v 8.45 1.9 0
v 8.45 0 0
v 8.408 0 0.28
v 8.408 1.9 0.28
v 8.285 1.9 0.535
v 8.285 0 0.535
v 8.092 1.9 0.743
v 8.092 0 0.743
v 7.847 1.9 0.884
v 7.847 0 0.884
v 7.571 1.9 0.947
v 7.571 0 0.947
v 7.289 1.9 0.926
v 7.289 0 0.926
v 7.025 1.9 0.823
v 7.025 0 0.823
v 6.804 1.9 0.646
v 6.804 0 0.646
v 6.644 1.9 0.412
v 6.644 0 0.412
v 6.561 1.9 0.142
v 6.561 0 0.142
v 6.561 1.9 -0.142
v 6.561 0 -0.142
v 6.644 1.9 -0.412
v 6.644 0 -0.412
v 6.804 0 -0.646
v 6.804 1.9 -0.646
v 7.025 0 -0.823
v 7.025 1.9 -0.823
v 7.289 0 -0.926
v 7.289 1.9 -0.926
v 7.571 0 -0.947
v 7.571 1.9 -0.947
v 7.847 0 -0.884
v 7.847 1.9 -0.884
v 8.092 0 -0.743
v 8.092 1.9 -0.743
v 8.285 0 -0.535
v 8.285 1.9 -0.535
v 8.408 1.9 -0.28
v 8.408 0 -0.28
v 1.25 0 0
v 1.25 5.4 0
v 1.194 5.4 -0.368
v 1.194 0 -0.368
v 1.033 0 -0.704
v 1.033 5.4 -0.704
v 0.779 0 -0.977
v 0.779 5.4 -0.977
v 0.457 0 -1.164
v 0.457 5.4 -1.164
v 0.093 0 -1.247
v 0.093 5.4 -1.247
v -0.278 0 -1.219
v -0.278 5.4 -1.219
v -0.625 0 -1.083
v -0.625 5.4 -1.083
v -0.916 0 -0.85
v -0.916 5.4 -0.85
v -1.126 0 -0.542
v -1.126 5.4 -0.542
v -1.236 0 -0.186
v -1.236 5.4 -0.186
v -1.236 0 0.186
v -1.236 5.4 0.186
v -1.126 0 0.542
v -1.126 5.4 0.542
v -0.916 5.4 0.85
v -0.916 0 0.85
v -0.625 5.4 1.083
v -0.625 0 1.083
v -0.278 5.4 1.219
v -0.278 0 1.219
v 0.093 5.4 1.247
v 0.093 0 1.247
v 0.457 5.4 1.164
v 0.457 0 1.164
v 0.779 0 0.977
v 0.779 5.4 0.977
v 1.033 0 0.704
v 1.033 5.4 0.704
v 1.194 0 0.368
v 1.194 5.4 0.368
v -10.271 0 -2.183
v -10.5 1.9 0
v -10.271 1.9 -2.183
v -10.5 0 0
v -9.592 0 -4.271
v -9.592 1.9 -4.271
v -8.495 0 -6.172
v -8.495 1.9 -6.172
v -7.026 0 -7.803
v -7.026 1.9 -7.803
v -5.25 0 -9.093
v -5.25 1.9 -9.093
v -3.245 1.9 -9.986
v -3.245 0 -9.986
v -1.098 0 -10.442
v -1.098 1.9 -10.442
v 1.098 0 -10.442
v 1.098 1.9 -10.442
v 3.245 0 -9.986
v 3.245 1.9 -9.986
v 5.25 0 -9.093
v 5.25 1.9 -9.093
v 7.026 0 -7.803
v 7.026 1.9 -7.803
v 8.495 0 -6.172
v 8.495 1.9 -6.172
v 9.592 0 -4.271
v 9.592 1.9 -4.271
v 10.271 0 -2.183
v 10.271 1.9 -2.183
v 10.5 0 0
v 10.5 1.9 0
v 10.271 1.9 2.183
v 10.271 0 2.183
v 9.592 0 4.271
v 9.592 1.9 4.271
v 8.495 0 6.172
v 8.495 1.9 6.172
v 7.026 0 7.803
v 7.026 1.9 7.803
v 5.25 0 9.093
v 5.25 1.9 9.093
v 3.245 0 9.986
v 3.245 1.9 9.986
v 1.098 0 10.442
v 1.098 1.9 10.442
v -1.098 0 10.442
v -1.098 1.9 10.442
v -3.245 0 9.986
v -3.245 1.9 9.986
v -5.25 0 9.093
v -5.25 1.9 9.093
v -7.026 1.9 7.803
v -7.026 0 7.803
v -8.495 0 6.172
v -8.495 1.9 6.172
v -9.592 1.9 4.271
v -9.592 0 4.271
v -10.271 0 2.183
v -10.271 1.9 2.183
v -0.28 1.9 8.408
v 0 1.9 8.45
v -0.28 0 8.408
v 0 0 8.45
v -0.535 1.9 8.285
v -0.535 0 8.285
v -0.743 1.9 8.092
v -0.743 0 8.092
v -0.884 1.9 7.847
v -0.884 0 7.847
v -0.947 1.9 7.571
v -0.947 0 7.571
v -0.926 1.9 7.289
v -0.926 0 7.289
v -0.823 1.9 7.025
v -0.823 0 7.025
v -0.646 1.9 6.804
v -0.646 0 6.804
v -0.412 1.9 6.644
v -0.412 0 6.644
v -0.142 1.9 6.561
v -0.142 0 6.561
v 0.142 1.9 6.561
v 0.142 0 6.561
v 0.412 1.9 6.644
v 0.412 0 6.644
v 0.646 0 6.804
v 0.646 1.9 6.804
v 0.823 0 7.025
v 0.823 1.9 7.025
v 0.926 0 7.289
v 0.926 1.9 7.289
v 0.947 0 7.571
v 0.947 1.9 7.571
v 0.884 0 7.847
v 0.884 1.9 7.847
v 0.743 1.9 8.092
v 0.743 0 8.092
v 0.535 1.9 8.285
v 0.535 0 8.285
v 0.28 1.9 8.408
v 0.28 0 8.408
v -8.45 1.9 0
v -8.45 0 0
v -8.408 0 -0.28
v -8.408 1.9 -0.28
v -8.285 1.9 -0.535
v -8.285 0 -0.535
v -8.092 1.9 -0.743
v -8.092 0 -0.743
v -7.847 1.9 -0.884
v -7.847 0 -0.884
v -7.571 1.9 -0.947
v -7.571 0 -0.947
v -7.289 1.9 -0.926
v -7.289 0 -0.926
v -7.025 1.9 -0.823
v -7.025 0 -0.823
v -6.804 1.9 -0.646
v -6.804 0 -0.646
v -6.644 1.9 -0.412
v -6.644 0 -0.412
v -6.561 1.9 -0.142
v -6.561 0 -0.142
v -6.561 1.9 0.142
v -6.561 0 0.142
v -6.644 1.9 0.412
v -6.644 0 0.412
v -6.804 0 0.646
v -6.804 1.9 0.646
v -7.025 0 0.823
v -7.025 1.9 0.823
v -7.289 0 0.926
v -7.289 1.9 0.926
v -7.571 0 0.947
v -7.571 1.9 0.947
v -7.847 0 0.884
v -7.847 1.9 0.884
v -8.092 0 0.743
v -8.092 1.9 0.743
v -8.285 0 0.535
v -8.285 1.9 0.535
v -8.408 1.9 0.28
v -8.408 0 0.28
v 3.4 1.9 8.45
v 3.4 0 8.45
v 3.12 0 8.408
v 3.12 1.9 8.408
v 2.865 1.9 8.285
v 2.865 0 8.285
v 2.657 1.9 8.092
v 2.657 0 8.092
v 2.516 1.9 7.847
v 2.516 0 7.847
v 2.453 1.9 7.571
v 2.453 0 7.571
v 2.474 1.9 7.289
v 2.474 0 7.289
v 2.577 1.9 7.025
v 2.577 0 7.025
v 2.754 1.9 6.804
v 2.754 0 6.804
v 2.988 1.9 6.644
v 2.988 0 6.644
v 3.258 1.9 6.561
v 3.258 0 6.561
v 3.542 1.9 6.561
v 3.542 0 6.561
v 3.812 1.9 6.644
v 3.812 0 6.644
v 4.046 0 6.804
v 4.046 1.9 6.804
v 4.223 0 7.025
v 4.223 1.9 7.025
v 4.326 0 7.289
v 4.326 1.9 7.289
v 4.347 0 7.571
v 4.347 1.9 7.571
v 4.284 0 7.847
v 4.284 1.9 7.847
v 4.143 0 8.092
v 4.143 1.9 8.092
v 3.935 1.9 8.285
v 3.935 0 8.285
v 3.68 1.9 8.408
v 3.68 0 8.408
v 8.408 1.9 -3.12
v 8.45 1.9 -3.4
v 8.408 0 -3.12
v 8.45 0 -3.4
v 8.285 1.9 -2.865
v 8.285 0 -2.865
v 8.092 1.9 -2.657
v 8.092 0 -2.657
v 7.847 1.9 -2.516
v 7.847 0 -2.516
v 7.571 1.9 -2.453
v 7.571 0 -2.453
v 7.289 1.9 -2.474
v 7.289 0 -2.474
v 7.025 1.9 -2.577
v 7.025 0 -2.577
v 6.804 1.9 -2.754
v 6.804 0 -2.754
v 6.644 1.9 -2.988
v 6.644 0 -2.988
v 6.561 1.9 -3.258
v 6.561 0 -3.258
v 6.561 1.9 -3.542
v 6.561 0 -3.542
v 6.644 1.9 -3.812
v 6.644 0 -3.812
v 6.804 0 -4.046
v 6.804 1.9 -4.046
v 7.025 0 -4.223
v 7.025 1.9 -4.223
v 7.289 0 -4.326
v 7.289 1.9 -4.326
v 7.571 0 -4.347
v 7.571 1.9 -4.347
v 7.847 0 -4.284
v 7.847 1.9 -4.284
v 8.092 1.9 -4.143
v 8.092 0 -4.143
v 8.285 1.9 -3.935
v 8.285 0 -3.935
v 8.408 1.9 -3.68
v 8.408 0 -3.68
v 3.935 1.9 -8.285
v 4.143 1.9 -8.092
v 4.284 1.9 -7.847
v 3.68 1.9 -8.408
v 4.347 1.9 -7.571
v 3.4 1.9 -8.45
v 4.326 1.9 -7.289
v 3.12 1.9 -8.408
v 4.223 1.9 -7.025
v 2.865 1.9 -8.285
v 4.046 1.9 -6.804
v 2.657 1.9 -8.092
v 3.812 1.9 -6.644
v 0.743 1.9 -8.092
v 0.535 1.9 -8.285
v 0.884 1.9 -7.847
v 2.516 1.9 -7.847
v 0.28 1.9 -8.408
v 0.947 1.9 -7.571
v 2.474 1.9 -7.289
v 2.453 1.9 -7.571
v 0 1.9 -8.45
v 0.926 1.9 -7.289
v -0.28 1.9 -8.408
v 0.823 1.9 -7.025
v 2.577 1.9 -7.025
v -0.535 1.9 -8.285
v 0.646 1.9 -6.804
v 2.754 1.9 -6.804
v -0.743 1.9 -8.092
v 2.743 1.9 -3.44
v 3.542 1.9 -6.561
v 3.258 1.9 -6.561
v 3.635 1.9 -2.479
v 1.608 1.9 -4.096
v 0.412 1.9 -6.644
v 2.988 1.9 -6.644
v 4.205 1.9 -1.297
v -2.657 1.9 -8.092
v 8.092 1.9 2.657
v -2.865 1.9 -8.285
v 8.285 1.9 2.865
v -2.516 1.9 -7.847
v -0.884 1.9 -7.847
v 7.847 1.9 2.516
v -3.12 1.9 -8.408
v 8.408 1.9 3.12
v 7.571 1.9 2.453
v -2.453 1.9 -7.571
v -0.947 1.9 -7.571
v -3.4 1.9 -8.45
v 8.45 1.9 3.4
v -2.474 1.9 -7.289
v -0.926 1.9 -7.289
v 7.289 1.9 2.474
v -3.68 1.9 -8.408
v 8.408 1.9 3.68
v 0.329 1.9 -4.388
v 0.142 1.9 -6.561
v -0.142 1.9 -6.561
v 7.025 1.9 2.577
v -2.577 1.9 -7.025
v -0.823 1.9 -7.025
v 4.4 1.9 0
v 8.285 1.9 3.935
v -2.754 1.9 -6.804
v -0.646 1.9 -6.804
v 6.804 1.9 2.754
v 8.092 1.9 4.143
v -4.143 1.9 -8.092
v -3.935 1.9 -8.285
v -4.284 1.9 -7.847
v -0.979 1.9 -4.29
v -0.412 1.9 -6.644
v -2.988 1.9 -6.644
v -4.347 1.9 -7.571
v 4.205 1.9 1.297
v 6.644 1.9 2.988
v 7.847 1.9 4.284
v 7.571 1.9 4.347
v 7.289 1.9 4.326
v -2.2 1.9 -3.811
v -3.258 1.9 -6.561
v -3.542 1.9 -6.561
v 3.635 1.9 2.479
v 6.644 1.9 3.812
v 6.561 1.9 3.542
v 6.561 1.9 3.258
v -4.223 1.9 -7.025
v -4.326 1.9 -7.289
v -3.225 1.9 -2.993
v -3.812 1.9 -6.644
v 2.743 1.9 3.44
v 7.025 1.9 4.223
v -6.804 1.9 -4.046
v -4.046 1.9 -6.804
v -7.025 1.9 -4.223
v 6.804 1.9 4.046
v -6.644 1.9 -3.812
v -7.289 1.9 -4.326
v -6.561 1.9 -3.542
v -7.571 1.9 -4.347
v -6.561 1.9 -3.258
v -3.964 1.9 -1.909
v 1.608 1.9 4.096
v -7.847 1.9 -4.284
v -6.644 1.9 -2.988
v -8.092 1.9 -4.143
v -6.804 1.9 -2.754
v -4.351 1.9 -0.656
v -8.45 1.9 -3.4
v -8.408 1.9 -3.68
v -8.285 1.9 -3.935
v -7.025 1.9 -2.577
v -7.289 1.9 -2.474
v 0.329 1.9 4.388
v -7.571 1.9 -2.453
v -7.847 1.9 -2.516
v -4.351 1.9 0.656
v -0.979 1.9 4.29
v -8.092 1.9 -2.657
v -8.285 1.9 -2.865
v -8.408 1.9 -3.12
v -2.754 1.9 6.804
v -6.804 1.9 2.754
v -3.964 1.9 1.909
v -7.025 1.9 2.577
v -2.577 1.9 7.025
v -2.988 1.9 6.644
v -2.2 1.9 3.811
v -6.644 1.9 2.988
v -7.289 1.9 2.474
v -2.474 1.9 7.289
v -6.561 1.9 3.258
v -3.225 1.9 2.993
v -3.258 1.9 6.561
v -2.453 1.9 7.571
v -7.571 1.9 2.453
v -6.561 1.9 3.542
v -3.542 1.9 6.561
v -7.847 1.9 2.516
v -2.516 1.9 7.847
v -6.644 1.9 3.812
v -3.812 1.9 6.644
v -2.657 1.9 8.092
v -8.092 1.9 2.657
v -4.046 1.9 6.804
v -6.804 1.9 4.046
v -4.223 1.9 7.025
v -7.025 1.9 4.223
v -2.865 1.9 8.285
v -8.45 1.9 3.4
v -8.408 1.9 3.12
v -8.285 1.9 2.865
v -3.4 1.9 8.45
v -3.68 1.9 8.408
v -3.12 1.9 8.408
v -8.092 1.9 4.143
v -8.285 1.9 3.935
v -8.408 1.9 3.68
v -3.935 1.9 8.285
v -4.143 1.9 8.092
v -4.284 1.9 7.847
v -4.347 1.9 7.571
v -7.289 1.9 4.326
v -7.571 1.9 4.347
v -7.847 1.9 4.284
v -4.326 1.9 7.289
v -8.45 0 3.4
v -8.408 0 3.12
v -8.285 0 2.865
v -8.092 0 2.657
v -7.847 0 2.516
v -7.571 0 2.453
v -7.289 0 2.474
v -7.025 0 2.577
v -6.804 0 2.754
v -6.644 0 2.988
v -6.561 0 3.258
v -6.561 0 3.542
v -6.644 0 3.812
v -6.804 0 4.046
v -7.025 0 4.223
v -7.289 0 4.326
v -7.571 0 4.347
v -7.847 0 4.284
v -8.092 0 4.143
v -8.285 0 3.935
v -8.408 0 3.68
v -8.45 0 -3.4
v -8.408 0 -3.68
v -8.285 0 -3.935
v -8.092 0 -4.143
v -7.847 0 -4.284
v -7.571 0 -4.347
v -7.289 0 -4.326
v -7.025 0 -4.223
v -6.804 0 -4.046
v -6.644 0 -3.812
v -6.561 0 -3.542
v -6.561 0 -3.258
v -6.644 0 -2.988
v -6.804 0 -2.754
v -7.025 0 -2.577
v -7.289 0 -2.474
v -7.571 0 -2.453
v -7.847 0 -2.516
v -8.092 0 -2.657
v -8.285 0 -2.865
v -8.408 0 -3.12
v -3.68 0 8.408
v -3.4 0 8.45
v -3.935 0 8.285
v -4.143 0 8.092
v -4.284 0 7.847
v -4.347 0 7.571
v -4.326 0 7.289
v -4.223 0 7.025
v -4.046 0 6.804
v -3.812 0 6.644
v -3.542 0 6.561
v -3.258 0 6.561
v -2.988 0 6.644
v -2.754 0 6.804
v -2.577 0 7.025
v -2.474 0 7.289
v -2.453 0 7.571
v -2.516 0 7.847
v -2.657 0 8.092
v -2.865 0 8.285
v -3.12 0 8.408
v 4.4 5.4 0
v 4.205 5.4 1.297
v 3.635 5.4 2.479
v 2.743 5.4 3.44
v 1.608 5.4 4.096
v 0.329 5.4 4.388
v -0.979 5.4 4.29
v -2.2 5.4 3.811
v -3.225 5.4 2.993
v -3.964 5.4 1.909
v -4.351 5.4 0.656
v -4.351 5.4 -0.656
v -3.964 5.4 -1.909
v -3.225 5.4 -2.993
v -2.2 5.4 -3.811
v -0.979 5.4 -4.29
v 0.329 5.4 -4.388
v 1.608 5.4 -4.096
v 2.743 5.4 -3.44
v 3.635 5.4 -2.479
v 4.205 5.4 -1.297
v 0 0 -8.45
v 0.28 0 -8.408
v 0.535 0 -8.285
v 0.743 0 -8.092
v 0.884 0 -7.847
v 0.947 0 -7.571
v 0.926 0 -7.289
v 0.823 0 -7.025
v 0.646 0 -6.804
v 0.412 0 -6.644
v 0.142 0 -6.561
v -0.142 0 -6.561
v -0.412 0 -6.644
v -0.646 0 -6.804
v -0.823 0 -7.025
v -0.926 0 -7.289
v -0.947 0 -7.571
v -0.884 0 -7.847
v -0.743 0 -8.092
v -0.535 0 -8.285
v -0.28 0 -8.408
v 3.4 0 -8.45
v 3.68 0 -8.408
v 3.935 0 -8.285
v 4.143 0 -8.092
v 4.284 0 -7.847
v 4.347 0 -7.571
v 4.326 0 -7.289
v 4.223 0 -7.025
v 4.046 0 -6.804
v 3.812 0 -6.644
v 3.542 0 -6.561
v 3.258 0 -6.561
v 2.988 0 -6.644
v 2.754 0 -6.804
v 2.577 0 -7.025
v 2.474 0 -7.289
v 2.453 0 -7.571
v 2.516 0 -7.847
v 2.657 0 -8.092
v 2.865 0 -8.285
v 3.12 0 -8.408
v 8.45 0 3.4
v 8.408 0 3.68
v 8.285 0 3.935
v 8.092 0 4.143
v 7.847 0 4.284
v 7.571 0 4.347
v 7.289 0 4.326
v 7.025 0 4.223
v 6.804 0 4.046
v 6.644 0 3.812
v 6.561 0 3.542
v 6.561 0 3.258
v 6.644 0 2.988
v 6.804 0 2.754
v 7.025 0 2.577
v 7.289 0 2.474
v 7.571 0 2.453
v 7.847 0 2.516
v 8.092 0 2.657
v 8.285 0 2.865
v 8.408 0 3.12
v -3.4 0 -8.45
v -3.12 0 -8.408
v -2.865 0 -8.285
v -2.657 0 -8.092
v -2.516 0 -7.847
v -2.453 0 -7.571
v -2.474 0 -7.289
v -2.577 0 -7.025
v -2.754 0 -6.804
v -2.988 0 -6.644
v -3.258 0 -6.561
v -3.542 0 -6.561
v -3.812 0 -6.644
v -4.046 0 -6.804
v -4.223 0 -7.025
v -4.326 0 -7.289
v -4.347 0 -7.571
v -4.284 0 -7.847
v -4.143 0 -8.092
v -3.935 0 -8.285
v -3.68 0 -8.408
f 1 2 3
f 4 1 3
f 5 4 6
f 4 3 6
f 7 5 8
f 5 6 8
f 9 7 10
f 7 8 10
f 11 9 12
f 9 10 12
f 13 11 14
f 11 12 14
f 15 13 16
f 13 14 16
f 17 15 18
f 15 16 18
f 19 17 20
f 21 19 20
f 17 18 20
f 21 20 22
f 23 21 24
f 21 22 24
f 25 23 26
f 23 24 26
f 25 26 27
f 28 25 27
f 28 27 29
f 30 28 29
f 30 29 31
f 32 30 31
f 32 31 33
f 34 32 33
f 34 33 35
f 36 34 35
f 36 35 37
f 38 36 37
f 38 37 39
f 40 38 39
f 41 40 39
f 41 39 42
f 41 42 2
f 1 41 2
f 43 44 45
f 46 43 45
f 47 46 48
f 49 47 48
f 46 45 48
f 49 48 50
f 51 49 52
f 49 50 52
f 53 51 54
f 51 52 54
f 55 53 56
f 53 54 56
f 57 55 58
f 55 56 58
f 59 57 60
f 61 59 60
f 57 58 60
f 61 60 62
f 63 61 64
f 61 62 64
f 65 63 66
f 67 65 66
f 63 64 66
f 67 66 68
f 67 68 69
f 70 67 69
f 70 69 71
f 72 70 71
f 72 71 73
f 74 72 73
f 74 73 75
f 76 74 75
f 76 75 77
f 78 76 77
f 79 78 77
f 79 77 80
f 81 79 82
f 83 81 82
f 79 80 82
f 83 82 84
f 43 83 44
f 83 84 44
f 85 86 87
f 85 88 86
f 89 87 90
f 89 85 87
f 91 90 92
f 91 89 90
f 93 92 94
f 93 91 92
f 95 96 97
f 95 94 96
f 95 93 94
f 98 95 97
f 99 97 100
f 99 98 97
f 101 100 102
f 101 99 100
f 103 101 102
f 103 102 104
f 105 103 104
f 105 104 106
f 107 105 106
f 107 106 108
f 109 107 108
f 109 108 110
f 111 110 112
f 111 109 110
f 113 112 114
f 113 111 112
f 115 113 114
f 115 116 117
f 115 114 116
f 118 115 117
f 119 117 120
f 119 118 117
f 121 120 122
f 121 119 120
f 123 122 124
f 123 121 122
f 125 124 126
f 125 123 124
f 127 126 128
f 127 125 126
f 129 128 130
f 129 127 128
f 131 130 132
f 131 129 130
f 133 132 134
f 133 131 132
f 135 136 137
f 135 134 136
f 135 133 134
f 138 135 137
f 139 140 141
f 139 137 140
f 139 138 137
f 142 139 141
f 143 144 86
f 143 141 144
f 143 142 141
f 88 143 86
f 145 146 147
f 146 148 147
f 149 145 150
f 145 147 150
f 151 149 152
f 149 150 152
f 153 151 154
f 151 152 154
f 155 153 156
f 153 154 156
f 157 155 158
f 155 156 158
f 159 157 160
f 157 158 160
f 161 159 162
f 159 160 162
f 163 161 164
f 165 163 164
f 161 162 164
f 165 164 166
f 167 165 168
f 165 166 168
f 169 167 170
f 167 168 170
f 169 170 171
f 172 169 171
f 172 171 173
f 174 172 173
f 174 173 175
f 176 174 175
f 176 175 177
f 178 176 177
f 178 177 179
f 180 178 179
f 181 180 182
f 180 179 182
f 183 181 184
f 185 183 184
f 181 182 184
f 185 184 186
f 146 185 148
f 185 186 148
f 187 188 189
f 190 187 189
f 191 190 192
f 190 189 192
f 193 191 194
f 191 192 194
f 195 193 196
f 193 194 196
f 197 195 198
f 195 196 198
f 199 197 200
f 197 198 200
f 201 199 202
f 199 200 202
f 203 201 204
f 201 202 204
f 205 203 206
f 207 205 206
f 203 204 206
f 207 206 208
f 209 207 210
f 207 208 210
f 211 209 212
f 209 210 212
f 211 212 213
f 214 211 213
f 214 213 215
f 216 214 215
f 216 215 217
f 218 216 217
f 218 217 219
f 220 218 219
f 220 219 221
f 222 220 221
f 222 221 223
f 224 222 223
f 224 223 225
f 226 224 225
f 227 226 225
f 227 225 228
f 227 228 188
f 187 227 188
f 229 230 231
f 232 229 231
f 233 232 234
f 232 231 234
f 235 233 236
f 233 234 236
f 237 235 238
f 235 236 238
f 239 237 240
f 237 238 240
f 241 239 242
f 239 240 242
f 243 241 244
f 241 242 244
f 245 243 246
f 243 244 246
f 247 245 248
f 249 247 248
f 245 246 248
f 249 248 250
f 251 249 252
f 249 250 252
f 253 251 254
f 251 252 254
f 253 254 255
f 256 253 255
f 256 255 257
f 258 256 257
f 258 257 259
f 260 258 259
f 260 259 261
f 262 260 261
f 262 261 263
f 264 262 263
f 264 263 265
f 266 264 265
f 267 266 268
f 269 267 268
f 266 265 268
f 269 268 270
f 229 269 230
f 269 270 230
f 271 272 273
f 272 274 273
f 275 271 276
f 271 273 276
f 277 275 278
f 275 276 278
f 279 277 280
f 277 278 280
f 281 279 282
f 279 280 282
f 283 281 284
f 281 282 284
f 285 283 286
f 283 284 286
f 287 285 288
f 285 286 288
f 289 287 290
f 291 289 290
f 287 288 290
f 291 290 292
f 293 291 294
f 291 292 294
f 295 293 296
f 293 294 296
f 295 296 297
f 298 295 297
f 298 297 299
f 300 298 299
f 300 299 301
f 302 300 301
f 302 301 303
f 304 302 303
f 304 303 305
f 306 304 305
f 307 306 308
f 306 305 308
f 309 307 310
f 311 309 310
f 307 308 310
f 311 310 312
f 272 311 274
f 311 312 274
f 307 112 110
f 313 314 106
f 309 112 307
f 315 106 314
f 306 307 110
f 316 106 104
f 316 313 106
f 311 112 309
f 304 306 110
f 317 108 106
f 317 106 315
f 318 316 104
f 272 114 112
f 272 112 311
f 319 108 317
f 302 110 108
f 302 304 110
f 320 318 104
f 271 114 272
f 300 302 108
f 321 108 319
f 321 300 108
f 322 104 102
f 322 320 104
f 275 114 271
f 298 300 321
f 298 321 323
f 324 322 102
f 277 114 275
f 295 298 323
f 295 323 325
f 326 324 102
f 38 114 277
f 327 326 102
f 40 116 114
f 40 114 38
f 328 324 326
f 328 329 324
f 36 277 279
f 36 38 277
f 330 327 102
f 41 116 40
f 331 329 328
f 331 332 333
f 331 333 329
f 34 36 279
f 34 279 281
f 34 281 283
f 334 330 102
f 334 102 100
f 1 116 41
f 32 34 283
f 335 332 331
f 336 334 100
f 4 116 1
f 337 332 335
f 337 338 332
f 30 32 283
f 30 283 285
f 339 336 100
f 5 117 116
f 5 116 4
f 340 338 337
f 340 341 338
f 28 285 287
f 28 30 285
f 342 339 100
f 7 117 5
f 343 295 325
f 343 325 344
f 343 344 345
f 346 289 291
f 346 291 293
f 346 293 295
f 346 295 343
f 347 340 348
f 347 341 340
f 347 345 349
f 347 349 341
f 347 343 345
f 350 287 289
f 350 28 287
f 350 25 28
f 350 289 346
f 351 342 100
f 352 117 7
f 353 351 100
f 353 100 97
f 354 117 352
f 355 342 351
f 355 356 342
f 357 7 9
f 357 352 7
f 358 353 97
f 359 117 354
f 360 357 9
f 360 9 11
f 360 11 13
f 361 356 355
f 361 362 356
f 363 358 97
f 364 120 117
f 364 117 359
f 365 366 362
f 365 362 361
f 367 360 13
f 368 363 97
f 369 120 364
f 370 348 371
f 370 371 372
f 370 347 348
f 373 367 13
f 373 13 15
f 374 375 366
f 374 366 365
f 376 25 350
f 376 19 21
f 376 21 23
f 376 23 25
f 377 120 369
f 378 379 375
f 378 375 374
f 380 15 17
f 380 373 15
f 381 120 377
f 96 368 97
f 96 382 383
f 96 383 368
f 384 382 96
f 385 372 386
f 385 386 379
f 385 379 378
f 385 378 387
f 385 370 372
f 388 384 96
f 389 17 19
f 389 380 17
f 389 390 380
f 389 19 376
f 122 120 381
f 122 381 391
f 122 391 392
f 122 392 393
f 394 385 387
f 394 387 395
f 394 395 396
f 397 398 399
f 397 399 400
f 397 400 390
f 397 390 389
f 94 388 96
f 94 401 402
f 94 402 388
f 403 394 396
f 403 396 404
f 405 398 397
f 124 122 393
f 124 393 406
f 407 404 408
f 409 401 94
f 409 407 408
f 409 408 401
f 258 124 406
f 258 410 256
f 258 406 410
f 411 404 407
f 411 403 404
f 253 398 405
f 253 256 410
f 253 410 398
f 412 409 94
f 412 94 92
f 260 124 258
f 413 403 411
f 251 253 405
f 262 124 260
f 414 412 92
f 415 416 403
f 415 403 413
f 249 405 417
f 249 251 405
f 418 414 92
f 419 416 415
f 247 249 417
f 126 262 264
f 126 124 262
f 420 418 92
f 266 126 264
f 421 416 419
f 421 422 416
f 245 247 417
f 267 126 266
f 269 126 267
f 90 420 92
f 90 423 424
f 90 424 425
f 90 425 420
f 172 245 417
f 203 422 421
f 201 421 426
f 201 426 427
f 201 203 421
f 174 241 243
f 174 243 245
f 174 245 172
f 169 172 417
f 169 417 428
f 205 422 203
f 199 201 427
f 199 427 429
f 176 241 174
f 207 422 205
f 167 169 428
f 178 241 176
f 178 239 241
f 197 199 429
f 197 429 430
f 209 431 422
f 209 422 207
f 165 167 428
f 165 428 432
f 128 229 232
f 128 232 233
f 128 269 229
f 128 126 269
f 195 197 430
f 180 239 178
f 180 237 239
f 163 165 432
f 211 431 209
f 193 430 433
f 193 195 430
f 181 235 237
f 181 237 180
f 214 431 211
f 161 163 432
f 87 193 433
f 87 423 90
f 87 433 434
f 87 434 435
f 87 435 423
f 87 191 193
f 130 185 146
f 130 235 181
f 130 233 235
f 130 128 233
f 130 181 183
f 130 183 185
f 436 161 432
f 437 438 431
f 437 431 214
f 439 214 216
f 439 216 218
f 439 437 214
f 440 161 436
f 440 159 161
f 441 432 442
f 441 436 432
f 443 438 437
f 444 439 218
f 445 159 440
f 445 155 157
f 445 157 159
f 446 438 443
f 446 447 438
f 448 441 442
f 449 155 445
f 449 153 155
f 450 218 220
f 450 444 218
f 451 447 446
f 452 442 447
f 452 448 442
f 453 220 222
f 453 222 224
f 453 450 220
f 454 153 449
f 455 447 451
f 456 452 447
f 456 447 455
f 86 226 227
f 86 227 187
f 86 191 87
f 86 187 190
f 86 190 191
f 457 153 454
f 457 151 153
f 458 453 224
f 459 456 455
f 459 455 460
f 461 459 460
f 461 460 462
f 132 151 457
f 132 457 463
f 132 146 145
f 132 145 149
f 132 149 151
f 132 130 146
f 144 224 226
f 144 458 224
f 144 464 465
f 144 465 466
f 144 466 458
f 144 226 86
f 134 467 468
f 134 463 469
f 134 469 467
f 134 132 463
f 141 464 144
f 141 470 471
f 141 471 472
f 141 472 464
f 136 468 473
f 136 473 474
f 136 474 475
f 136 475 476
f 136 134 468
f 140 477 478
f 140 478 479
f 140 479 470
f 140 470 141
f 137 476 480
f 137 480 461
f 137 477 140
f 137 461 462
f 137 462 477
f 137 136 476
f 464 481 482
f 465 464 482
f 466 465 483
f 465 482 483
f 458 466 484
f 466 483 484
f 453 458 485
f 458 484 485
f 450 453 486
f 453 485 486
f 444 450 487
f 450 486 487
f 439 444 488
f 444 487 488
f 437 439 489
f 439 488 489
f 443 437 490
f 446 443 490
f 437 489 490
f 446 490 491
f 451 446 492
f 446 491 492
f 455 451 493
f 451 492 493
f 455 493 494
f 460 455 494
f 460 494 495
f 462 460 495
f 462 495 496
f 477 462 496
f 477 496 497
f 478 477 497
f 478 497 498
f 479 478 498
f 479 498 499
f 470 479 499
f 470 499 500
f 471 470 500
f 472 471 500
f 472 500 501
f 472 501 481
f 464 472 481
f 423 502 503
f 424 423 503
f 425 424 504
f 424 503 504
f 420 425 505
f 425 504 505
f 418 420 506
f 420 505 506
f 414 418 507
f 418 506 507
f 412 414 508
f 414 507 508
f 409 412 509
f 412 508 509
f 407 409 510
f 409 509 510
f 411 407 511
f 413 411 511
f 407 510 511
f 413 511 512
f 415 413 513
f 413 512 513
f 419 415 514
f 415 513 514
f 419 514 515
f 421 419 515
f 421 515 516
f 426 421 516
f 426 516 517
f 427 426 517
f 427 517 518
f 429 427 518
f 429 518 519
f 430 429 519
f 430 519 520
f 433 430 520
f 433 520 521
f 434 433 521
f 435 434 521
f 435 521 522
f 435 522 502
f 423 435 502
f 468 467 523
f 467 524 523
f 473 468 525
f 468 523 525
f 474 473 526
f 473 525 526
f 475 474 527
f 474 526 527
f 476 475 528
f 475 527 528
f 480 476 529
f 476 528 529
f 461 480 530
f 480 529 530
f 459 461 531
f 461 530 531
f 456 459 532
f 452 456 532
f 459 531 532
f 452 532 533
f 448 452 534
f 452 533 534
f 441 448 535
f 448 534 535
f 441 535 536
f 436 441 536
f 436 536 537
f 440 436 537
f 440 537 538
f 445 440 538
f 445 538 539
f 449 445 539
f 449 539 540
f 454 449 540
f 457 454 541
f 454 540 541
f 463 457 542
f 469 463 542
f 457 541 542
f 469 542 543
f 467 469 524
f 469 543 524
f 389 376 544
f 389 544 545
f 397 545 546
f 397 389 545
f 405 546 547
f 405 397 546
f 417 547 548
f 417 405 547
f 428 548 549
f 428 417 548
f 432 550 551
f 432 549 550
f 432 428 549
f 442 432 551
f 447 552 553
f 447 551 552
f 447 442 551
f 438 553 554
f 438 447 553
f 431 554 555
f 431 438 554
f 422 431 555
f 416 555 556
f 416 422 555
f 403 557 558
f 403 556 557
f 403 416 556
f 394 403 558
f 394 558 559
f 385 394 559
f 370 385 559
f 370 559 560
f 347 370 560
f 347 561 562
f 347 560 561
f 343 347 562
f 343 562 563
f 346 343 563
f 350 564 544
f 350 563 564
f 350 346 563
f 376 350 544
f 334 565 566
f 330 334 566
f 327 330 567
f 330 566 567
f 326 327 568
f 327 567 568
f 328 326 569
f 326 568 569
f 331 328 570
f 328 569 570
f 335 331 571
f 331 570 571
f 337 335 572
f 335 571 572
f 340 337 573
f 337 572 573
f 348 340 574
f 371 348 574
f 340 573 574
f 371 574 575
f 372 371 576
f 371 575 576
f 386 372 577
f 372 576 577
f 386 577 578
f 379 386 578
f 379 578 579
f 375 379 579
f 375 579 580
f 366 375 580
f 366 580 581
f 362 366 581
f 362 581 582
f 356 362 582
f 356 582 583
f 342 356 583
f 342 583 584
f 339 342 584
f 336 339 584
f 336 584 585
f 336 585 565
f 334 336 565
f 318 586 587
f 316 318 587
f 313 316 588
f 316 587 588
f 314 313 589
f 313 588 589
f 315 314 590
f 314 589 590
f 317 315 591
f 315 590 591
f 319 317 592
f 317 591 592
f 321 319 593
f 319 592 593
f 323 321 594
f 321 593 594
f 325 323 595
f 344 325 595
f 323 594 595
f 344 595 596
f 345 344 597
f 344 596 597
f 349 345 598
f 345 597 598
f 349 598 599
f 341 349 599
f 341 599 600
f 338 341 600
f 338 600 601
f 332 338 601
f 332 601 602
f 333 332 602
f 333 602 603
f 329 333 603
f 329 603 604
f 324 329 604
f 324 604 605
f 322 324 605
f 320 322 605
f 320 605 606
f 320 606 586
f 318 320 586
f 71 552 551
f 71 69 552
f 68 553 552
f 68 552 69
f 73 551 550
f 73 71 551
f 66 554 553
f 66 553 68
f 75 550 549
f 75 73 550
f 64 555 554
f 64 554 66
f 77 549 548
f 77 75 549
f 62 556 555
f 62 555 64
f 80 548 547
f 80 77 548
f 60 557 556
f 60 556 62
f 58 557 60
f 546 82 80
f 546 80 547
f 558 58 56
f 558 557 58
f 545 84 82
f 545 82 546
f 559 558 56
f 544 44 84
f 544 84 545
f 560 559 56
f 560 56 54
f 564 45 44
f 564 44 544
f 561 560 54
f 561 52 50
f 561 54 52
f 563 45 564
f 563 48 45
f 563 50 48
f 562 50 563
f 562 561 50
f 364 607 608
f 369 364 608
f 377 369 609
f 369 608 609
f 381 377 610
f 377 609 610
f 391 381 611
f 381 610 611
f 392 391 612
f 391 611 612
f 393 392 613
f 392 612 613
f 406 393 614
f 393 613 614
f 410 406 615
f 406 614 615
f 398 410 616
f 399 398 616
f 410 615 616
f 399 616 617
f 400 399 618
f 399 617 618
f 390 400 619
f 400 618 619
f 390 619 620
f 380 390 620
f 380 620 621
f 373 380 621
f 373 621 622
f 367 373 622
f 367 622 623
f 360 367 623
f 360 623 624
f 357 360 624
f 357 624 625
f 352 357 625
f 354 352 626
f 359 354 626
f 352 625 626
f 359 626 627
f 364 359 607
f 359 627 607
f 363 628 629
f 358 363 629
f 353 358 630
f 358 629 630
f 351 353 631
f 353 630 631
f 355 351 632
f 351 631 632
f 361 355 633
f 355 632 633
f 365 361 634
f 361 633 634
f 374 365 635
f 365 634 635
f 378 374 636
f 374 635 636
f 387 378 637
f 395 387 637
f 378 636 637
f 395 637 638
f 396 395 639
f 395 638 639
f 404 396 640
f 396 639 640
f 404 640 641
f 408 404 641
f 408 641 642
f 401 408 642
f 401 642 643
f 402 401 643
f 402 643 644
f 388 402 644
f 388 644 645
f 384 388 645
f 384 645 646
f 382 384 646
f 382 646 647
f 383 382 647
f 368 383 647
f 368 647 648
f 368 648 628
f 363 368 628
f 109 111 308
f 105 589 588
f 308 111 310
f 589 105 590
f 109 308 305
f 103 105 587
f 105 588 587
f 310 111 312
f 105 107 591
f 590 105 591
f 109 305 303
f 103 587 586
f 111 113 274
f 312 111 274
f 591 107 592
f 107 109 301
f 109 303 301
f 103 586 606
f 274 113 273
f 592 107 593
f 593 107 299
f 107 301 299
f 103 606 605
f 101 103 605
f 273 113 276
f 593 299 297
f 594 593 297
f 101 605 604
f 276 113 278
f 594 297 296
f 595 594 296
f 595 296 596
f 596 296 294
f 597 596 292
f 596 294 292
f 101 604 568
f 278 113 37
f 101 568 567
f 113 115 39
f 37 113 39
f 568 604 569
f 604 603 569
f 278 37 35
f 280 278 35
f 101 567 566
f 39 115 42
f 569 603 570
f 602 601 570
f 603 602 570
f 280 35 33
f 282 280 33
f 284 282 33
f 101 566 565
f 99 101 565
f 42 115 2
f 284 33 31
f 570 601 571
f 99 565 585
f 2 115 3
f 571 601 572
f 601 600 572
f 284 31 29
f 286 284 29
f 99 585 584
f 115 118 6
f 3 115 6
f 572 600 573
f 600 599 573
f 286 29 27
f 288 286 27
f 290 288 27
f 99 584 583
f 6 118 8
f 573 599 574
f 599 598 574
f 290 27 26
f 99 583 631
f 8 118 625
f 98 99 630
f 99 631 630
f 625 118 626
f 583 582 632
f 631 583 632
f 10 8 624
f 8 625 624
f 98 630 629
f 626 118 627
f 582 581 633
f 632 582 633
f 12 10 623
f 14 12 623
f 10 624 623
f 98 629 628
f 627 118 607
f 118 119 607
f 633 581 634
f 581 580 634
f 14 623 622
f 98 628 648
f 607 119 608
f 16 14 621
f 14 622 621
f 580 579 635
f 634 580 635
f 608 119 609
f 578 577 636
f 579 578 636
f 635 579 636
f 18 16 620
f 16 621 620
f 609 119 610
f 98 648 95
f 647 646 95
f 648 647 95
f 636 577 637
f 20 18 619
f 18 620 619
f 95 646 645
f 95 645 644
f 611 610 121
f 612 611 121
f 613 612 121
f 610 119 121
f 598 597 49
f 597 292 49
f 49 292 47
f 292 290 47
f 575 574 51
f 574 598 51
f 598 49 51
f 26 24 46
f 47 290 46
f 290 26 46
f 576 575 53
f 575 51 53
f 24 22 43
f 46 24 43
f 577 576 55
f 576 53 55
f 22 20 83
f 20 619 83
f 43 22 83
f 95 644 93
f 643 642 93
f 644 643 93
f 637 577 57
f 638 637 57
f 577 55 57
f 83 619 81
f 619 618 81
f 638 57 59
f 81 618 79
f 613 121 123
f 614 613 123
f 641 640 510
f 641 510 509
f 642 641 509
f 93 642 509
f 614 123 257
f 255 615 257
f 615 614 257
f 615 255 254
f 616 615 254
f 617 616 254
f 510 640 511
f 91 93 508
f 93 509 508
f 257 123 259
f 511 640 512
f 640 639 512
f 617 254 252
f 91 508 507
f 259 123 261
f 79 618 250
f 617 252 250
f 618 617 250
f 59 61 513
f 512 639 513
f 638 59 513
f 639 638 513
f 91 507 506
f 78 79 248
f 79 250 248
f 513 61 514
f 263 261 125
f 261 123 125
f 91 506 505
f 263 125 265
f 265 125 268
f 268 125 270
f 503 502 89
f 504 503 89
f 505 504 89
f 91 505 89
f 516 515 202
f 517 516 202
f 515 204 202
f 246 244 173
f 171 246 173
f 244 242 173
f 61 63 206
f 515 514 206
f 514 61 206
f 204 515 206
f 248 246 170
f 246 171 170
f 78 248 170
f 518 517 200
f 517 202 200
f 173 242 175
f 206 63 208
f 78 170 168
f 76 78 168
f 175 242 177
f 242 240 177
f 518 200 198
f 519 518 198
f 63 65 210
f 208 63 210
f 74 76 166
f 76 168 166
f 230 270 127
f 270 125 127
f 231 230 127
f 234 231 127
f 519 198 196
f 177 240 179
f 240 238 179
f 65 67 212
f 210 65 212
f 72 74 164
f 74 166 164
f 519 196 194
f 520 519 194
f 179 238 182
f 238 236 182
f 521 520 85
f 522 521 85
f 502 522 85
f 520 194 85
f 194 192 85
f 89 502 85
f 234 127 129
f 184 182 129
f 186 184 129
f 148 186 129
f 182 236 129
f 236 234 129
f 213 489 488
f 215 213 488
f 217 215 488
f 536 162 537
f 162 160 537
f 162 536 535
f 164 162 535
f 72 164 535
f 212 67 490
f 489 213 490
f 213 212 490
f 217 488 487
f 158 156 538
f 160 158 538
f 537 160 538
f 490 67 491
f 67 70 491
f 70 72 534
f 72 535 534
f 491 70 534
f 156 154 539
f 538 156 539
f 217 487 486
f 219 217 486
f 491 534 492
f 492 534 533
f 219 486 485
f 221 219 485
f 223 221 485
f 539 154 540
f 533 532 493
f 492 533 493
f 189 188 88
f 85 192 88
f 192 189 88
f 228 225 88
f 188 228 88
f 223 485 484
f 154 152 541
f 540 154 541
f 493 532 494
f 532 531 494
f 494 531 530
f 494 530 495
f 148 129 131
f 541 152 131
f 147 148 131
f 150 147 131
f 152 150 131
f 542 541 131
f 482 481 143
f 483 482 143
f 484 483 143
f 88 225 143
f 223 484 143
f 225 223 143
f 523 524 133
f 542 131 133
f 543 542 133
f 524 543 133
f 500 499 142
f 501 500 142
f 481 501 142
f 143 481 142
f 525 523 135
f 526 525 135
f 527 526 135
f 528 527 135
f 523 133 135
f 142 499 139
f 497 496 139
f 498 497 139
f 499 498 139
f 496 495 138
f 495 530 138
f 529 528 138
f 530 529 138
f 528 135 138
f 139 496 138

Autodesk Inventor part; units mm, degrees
ref_plane "YZ Plane" through (0, 0, 0) normal (1, 0, 0) x (0, 1, 0)
ref_plane "XZ Plane" through (0, 0, 0) normal (0, 1, 0) x (-1, 0, 0)
ref_plane "XY Plane" through (0, 0, 0) normal (0, 0, 1) x (1, 0, 0)
sketch "Sketch1" plane through (0, 0, 0) normal (0, 1, 0) x (-1, 0, 0)
  circle A0 centre (0, 0) radius 10.5
  dimension "d0" = 21
extrude "Extrusion1" add sketch "Sketch1" along normal blind 1.9
sketch "Sketch2" plane through (0, 1.9, 0) normal (0, 1, 0) x (1, 0, 0)
  circle A0 centre (0, 0) radius 4.4
  dimension "d3" = 8.8
extrude "Extrusion2" add sketch "Sketch2" along normal blind 3.5
sketch "Sketch3" plane through (0, 5.4, 0) normal (0, 1, 0) x (1, 0, 0)
  circle A0 centre (0, 0) radius 1.25
  dimension "d6" = 2.5
extrude "Extrusion3" cut sketch "Sketch3" against normal through all
sketch "Sketch4" plane through (0, 0, 0) normal (0, -1, 0) x (1, 0, 0)
  circle A0 centre (7.5, 0) radius 0.95
  circle A1 centre (7.5, -3.4) radius 0.95
  circle A2 centre (7.5, 3.4) radius 0.95
  point P0 (0, 0)
  dimension "d9" = 1.9
  dimension "d10" = 7.5
  dimension "d11" = 1.9
  dimension "d12" = 3.4
  dimension "d13" = 7.5
  dimension "d14" = 1.9
  dimension "d15" = 3.4
  dimension "d16" = 7.5
extrude "Extrusion4" cut sketch "Sketch4" against normal through all
pattern_circular "Circular Pattern1" count 4 over 360 about axis through (0, -10, 0) along (0, 1, 0) of "Extrusion4"
equation "\"d13\" = d10"
equation "\"d15\" = d12"
equation "\"d16\" = d10"
properties part number "horn"
